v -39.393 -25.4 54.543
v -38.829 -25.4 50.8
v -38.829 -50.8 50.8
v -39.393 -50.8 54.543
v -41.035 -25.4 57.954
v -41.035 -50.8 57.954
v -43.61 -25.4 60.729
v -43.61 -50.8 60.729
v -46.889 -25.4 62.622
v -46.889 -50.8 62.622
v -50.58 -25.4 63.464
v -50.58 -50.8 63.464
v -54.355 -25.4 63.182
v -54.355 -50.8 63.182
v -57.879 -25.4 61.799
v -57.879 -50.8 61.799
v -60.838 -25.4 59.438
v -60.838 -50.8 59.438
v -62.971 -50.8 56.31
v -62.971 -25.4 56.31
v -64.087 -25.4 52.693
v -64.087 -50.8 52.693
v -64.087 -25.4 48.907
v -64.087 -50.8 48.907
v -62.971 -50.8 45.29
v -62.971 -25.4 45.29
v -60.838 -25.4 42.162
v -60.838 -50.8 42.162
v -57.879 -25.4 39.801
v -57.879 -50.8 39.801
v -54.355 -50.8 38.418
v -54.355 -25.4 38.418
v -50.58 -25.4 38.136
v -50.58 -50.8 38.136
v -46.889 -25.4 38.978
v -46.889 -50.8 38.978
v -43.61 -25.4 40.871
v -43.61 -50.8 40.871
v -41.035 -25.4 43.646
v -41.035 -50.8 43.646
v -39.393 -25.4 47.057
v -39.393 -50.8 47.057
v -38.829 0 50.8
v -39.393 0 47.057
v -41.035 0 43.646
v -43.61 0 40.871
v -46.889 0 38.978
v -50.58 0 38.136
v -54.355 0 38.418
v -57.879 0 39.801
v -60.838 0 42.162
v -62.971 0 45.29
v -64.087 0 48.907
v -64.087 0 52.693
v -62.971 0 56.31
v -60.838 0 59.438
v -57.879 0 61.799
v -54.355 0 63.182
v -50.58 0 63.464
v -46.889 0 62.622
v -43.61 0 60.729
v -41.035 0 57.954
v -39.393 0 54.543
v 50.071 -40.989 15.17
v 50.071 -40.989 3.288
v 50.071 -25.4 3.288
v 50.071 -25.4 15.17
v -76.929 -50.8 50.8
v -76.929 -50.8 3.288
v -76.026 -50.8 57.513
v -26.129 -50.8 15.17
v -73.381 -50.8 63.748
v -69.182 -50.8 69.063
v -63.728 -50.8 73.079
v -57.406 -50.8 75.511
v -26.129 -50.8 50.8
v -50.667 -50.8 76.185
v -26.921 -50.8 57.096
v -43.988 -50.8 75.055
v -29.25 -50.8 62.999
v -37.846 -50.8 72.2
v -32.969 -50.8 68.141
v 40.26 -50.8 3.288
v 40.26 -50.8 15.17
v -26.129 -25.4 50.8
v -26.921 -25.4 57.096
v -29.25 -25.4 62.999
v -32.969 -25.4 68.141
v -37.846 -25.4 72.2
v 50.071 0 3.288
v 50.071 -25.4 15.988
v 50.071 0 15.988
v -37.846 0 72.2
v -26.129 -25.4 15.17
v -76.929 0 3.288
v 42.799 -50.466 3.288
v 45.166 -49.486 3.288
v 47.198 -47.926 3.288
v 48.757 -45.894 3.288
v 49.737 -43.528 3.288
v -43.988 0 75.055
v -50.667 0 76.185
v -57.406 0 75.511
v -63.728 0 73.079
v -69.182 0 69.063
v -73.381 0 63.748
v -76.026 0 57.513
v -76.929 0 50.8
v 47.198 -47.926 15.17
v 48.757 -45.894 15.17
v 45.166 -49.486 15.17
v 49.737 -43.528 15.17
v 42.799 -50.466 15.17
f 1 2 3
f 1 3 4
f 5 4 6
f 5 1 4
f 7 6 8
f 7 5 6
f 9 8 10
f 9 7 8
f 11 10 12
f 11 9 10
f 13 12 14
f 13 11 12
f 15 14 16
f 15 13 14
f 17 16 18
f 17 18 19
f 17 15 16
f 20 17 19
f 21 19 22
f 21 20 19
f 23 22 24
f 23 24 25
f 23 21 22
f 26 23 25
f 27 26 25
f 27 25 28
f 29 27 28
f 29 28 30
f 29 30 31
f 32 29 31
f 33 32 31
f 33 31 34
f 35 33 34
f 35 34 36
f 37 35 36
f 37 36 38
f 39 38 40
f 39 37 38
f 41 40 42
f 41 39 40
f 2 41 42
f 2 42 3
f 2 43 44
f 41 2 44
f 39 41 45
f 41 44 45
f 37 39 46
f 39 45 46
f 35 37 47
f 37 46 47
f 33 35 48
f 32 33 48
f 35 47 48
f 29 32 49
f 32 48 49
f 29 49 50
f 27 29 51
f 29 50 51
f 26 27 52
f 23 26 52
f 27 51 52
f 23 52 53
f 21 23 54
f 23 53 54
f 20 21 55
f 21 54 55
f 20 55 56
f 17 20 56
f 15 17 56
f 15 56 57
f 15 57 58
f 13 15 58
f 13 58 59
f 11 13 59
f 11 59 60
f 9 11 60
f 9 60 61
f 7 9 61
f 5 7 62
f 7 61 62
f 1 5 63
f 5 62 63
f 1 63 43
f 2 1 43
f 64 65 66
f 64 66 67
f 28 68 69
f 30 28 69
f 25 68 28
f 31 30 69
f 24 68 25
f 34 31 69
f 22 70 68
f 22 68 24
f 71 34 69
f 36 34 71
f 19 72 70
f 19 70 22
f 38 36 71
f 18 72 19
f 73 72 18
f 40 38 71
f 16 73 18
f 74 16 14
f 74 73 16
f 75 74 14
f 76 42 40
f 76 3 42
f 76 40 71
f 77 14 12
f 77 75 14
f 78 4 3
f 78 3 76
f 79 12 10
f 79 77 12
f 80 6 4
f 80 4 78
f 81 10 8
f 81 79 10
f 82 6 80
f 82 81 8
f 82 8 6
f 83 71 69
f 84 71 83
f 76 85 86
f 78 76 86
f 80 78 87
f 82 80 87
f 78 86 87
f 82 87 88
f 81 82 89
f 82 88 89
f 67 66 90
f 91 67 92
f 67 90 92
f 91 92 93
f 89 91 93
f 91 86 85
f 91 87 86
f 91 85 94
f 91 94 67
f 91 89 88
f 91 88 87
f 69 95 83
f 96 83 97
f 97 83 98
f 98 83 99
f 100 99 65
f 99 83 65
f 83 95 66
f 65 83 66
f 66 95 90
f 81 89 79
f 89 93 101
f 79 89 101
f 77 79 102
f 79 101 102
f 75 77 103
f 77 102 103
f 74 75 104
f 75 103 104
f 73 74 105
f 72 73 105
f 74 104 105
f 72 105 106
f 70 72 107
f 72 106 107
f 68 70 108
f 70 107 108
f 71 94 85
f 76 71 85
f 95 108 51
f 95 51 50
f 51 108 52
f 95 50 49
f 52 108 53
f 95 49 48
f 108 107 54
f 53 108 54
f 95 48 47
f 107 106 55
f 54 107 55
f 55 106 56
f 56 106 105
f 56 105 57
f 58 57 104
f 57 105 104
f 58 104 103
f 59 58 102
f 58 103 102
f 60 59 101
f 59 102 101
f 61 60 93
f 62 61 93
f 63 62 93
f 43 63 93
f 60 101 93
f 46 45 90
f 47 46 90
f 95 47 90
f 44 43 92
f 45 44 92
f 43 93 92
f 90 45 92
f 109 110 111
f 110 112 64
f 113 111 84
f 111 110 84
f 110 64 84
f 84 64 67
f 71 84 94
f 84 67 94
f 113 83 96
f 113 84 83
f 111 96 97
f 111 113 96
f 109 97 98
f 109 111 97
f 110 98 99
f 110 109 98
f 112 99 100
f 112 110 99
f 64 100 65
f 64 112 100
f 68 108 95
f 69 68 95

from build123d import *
from build123d import SkipClean  # not in build123d's __all__

# Parameters (mm, degrees)
F1_DEPTH = 25.4
F2_R     = 12.7
F3_DEPTH = 25.4
F4_R     = 9.8113639175


with BuildPart() as f1:
    # F0 (on Front) → F1 (new body)
    with BuildSketch(Plane.XZ):
        with BuildLine():
            ThreePointArc((-37.8463725496, 72.1998437426), (-63.7276630417, 73.0788204047), (-76.9287220478, 50.8))
            Line((-76.9287220478, 50.8), (-76.9287220478, 3.2882173546))
            Line((-76.9287220478, 3.2882173546), (50.0712779522, 3.2882173546))
            Line((50.0712779522, 3.2882173546), (50.0712779522, 15.9882173546))
            Line((50.0712779522, 15.9882173546), (-37.8463725496, 72.1998437426))
        make_face()
        with BuildLine():
            ThreePointArc((-64.2287220478, 50.8), (-51.5287220478, 63.5), (-38.8287220478, 50.8))
            ThreePointArc((-38.8287220478, 50.8), (-51.5287220478, 38.1), (-64.2287220478, 50.8))
        make_face(mode=Mode.SUBTRACT)
    extrude(amount=F1_DEPTH)

    # F2 (on face) → F3 (join)
    with BuildSketch(Plane.XZ.offset(25.4)):
        with BuildLine():
            Line((-26.1287220478, 15.9882173546), (-26.1287220478, 50.8))
            ThreePointArc((-26.1287220478, 50.8), (-29.2499016431, 62.9989409939), (-37.8463725496, 72.1998437426))
            ThreePointArc((-37.8463725496, 72.1998437426), (-63.7276630417, 73.0788204047), (-76.9287220478, 50.8))
            Line((-76.9287220478, 50.8), (-76.9287220478, 15.1695013046))
            Line((-76.9287220478, 15.1695013046), (-76.9287220478, 3.2882173546))
            Line((-76.9287220478, 3.2882173546), (50.0712779522, 3.2882173546))
            Line((50.0712779522, 3.2882173546), (50.0712779522, 15.1695013046))
            Line((50.0712779522, 15.1695013046), (-26.1287220478, 15.1695013046))
            Line((-26.1287220478, 15.1695013046), (-26.1287220478, 15.9882173546))
        make_face()
        with Locations((-51.5287220478, 50.8)):
            Circle(F2_R, mode=Mode.SUBTRACT)
    with SkipClean():  # cleaning this boolean's faces spoils the solid; the shape is the same uncleaned
        extrude(amount=F3_DEPTH)

    # F4
    f4_edges = [f1.edges().sort_by_distance(p)[0] for p in [
        (50.071278, -50.8, 9.228859),
    ]]
    fillet(f4_edges, radius=F4_R)


solid = f1.part
